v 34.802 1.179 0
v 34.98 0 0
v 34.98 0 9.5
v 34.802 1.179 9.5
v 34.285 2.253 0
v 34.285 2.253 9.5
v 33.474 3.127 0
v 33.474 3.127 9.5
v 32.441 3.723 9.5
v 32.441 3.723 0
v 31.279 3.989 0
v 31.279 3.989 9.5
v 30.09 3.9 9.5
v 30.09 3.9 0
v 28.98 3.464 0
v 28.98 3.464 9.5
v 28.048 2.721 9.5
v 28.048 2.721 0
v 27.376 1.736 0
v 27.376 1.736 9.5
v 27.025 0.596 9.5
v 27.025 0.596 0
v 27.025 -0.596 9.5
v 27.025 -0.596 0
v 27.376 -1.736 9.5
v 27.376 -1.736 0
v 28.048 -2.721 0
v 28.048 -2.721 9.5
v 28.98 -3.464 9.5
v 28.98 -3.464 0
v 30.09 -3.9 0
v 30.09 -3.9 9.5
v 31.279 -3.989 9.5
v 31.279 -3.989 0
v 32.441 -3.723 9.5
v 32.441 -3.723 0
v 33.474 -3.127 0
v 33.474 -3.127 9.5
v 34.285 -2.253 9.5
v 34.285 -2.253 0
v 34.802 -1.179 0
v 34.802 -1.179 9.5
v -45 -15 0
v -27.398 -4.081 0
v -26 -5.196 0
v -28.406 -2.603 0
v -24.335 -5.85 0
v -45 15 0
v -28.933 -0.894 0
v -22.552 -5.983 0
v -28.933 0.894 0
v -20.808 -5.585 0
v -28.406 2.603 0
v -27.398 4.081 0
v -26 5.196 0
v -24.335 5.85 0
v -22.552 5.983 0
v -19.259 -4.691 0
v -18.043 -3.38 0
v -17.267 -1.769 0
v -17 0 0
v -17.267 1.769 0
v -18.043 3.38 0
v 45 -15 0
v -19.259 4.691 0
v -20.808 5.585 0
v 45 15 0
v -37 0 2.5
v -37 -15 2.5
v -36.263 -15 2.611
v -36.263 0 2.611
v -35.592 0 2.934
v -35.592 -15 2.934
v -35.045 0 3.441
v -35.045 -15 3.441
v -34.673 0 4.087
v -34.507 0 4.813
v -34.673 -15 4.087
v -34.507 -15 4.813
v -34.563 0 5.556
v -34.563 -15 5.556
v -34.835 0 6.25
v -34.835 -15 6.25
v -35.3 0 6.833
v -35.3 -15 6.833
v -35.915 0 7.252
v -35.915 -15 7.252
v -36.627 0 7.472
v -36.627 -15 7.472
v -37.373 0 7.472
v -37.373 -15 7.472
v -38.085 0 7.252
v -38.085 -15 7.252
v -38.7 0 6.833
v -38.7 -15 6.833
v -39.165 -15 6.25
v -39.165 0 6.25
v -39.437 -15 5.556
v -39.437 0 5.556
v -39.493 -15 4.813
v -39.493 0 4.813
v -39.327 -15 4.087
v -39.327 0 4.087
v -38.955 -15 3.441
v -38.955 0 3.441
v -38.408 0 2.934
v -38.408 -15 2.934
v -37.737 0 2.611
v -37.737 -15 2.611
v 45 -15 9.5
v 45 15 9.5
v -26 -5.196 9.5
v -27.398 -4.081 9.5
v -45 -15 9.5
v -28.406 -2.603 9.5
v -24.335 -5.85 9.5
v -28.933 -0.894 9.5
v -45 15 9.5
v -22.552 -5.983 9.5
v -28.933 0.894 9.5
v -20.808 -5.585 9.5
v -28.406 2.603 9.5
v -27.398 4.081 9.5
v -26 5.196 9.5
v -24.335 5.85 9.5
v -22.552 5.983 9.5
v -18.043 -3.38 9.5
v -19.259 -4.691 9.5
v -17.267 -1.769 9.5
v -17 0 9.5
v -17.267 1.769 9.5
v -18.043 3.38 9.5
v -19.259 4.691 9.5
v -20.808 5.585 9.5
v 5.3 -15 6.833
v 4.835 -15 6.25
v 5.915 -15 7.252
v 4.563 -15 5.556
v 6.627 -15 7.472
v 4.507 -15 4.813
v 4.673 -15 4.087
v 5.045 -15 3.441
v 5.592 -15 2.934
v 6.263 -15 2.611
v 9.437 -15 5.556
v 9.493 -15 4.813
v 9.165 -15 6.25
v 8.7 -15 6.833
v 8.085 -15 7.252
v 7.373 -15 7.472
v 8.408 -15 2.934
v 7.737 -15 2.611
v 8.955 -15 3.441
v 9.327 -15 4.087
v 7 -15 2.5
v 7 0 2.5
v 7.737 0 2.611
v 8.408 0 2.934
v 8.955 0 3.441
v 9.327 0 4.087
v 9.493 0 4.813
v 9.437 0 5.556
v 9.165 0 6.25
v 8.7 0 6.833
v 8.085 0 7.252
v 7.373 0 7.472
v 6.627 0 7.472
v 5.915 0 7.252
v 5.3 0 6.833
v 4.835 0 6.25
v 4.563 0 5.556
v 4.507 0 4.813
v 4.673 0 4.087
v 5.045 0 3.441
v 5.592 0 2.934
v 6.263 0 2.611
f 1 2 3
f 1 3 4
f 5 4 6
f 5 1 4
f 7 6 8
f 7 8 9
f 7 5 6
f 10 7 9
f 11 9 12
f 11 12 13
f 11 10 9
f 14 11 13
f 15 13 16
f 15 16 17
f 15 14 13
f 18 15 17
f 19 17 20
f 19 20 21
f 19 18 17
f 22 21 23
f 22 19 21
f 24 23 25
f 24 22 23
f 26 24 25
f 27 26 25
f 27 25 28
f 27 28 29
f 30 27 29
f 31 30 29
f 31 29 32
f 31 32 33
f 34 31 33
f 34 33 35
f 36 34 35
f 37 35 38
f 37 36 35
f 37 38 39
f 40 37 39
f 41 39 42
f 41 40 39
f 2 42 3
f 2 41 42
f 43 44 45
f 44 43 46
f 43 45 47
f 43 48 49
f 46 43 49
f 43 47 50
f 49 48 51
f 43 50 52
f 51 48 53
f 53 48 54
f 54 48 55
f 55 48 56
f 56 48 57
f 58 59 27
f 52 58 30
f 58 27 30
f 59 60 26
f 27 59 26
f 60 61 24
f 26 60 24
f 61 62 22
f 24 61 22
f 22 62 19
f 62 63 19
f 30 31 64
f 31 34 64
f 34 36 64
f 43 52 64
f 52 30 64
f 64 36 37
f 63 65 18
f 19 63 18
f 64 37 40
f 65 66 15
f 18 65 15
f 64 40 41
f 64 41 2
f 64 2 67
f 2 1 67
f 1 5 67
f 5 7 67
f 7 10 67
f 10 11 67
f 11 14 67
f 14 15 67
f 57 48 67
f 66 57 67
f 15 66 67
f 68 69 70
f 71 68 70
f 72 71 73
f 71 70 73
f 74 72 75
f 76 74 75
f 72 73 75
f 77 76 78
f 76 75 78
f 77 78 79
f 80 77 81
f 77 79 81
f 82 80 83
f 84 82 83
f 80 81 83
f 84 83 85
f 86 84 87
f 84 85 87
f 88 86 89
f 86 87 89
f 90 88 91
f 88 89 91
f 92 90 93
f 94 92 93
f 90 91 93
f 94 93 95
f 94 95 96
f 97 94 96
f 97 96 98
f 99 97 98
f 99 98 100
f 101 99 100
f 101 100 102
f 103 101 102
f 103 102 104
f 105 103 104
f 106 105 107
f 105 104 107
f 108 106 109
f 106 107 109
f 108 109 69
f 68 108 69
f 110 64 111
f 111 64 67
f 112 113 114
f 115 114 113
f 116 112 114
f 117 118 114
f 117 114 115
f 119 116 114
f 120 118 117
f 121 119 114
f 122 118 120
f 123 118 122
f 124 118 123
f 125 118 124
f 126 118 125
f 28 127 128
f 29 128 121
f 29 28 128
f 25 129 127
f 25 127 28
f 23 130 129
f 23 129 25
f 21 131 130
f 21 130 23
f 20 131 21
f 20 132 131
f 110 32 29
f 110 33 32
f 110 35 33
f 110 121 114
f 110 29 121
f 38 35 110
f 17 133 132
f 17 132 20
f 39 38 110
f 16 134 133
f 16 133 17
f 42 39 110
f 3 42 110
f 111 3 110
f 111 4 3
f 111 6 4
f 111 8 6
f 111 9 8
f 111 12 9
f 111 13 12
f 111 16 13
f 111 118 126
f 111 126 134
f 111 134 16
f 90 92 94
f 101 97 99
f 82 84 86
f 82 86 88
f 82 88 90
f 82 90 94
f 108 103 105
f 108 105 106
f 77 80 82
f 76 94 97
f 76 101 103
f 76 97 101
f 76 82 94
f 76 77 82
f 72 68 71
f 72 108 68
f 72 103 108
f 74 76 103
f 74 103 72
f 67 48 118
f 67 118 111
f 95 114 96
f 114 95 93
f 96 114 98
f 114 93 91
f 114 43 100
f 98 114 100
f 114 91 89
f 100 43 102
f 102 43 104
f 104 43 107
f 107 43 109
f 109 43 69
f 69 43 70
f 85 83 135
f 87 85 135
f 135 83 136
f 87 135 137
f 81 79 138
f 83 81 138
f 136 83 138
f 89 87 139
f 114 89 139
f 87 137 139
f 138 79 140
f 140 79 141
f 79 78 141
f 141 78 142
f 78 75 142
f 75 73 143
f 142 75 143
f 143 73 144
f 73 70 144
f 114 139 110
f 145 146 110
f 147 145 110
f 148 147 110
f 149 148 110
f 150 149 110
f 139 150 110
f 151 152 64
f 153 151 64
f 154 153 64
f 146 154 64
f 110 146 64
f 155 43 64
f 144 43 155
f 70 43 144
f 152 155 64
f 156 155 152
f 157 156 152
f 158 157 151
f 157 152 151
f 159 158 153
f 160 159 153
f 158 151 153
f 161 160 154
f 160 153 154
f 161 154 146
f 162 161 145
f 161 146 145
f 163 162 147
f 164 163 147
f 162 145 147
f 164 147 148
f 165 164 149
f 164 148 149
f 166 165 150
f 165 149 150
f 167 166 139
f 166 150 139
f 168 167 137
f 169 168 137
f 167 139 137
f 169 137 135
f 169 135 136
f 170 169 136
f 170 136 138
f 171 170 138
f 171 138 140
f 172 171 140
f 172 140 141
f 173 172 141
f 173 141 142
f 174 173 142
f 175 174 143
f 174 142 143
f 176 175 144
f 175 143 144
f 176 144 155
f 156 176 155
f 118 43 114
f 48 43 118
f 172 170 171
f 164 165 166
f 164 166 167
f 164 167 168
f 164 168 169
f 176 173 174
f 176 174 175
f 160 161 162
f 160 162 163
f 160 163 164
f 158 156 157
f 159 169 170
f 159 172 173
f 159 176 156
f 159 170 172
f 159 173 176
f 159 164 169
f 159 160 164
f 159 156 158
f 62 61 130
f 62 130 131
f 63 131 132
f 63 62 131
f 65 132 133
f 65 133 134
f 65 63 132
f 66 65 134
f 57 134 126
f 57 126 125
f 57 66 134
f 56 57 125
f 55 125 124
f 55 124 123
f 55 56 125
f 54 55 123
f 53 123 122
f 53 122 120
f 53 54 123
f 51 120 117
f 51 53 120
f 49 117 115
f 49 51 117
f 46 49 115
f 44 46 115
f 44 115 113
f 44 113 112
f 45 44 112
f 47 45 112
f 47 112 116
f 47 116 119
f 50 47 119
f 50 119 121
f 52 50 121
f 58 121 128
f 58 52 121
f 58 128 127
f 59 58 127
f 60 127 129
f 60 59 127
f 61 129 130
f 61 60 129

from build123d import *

# Parameters (mm, degrees)
SKETCH1_W           = 90
SKETCH1_H           = 30
SKETCH1_R           = 6
SKETCH1_R_2         = 4
BOSS_EXTRUDE1_DEPTH = 9.5
SKETCH2_R           = 2.5
CUT_EXTRUDE1_DEPTH  = 15


with BuildPart() as part:
    # Sketch1 → Boss-Extrude1 (new body)
    with BuildSketch(Plane.XY):
        Rectangle(SKETCH1_W, SKETCH1_H)
        with Locations((-23, 0)):
            Circle(SKETCH1_R, mode=Mode.SUBTRACT)
        with Locations((30.98, 0)):
            Circle(SKETCH1_R_2, mode=Mode.SUBTRACT)
    extrude(amount=BOSS_EXTRUDE1_DEPTH)

    # Sketch2 → Cut-Extrude1 (cut)
    with BuildSketch(Plane.XZ.offset(15)):
        with Locations(Location((7, 5, 0), (0, 0, 270))):
            Circle(SKETCH2_R)
        with Locations(Location((-37, 5, 0), (0, 0, 270))):
            Circle(SKETCH2_R)
    extrude(amount=-CUT_EXTRUDE1_DEPTH, mode=Mode.SUBTRACT)


solid = part.part
